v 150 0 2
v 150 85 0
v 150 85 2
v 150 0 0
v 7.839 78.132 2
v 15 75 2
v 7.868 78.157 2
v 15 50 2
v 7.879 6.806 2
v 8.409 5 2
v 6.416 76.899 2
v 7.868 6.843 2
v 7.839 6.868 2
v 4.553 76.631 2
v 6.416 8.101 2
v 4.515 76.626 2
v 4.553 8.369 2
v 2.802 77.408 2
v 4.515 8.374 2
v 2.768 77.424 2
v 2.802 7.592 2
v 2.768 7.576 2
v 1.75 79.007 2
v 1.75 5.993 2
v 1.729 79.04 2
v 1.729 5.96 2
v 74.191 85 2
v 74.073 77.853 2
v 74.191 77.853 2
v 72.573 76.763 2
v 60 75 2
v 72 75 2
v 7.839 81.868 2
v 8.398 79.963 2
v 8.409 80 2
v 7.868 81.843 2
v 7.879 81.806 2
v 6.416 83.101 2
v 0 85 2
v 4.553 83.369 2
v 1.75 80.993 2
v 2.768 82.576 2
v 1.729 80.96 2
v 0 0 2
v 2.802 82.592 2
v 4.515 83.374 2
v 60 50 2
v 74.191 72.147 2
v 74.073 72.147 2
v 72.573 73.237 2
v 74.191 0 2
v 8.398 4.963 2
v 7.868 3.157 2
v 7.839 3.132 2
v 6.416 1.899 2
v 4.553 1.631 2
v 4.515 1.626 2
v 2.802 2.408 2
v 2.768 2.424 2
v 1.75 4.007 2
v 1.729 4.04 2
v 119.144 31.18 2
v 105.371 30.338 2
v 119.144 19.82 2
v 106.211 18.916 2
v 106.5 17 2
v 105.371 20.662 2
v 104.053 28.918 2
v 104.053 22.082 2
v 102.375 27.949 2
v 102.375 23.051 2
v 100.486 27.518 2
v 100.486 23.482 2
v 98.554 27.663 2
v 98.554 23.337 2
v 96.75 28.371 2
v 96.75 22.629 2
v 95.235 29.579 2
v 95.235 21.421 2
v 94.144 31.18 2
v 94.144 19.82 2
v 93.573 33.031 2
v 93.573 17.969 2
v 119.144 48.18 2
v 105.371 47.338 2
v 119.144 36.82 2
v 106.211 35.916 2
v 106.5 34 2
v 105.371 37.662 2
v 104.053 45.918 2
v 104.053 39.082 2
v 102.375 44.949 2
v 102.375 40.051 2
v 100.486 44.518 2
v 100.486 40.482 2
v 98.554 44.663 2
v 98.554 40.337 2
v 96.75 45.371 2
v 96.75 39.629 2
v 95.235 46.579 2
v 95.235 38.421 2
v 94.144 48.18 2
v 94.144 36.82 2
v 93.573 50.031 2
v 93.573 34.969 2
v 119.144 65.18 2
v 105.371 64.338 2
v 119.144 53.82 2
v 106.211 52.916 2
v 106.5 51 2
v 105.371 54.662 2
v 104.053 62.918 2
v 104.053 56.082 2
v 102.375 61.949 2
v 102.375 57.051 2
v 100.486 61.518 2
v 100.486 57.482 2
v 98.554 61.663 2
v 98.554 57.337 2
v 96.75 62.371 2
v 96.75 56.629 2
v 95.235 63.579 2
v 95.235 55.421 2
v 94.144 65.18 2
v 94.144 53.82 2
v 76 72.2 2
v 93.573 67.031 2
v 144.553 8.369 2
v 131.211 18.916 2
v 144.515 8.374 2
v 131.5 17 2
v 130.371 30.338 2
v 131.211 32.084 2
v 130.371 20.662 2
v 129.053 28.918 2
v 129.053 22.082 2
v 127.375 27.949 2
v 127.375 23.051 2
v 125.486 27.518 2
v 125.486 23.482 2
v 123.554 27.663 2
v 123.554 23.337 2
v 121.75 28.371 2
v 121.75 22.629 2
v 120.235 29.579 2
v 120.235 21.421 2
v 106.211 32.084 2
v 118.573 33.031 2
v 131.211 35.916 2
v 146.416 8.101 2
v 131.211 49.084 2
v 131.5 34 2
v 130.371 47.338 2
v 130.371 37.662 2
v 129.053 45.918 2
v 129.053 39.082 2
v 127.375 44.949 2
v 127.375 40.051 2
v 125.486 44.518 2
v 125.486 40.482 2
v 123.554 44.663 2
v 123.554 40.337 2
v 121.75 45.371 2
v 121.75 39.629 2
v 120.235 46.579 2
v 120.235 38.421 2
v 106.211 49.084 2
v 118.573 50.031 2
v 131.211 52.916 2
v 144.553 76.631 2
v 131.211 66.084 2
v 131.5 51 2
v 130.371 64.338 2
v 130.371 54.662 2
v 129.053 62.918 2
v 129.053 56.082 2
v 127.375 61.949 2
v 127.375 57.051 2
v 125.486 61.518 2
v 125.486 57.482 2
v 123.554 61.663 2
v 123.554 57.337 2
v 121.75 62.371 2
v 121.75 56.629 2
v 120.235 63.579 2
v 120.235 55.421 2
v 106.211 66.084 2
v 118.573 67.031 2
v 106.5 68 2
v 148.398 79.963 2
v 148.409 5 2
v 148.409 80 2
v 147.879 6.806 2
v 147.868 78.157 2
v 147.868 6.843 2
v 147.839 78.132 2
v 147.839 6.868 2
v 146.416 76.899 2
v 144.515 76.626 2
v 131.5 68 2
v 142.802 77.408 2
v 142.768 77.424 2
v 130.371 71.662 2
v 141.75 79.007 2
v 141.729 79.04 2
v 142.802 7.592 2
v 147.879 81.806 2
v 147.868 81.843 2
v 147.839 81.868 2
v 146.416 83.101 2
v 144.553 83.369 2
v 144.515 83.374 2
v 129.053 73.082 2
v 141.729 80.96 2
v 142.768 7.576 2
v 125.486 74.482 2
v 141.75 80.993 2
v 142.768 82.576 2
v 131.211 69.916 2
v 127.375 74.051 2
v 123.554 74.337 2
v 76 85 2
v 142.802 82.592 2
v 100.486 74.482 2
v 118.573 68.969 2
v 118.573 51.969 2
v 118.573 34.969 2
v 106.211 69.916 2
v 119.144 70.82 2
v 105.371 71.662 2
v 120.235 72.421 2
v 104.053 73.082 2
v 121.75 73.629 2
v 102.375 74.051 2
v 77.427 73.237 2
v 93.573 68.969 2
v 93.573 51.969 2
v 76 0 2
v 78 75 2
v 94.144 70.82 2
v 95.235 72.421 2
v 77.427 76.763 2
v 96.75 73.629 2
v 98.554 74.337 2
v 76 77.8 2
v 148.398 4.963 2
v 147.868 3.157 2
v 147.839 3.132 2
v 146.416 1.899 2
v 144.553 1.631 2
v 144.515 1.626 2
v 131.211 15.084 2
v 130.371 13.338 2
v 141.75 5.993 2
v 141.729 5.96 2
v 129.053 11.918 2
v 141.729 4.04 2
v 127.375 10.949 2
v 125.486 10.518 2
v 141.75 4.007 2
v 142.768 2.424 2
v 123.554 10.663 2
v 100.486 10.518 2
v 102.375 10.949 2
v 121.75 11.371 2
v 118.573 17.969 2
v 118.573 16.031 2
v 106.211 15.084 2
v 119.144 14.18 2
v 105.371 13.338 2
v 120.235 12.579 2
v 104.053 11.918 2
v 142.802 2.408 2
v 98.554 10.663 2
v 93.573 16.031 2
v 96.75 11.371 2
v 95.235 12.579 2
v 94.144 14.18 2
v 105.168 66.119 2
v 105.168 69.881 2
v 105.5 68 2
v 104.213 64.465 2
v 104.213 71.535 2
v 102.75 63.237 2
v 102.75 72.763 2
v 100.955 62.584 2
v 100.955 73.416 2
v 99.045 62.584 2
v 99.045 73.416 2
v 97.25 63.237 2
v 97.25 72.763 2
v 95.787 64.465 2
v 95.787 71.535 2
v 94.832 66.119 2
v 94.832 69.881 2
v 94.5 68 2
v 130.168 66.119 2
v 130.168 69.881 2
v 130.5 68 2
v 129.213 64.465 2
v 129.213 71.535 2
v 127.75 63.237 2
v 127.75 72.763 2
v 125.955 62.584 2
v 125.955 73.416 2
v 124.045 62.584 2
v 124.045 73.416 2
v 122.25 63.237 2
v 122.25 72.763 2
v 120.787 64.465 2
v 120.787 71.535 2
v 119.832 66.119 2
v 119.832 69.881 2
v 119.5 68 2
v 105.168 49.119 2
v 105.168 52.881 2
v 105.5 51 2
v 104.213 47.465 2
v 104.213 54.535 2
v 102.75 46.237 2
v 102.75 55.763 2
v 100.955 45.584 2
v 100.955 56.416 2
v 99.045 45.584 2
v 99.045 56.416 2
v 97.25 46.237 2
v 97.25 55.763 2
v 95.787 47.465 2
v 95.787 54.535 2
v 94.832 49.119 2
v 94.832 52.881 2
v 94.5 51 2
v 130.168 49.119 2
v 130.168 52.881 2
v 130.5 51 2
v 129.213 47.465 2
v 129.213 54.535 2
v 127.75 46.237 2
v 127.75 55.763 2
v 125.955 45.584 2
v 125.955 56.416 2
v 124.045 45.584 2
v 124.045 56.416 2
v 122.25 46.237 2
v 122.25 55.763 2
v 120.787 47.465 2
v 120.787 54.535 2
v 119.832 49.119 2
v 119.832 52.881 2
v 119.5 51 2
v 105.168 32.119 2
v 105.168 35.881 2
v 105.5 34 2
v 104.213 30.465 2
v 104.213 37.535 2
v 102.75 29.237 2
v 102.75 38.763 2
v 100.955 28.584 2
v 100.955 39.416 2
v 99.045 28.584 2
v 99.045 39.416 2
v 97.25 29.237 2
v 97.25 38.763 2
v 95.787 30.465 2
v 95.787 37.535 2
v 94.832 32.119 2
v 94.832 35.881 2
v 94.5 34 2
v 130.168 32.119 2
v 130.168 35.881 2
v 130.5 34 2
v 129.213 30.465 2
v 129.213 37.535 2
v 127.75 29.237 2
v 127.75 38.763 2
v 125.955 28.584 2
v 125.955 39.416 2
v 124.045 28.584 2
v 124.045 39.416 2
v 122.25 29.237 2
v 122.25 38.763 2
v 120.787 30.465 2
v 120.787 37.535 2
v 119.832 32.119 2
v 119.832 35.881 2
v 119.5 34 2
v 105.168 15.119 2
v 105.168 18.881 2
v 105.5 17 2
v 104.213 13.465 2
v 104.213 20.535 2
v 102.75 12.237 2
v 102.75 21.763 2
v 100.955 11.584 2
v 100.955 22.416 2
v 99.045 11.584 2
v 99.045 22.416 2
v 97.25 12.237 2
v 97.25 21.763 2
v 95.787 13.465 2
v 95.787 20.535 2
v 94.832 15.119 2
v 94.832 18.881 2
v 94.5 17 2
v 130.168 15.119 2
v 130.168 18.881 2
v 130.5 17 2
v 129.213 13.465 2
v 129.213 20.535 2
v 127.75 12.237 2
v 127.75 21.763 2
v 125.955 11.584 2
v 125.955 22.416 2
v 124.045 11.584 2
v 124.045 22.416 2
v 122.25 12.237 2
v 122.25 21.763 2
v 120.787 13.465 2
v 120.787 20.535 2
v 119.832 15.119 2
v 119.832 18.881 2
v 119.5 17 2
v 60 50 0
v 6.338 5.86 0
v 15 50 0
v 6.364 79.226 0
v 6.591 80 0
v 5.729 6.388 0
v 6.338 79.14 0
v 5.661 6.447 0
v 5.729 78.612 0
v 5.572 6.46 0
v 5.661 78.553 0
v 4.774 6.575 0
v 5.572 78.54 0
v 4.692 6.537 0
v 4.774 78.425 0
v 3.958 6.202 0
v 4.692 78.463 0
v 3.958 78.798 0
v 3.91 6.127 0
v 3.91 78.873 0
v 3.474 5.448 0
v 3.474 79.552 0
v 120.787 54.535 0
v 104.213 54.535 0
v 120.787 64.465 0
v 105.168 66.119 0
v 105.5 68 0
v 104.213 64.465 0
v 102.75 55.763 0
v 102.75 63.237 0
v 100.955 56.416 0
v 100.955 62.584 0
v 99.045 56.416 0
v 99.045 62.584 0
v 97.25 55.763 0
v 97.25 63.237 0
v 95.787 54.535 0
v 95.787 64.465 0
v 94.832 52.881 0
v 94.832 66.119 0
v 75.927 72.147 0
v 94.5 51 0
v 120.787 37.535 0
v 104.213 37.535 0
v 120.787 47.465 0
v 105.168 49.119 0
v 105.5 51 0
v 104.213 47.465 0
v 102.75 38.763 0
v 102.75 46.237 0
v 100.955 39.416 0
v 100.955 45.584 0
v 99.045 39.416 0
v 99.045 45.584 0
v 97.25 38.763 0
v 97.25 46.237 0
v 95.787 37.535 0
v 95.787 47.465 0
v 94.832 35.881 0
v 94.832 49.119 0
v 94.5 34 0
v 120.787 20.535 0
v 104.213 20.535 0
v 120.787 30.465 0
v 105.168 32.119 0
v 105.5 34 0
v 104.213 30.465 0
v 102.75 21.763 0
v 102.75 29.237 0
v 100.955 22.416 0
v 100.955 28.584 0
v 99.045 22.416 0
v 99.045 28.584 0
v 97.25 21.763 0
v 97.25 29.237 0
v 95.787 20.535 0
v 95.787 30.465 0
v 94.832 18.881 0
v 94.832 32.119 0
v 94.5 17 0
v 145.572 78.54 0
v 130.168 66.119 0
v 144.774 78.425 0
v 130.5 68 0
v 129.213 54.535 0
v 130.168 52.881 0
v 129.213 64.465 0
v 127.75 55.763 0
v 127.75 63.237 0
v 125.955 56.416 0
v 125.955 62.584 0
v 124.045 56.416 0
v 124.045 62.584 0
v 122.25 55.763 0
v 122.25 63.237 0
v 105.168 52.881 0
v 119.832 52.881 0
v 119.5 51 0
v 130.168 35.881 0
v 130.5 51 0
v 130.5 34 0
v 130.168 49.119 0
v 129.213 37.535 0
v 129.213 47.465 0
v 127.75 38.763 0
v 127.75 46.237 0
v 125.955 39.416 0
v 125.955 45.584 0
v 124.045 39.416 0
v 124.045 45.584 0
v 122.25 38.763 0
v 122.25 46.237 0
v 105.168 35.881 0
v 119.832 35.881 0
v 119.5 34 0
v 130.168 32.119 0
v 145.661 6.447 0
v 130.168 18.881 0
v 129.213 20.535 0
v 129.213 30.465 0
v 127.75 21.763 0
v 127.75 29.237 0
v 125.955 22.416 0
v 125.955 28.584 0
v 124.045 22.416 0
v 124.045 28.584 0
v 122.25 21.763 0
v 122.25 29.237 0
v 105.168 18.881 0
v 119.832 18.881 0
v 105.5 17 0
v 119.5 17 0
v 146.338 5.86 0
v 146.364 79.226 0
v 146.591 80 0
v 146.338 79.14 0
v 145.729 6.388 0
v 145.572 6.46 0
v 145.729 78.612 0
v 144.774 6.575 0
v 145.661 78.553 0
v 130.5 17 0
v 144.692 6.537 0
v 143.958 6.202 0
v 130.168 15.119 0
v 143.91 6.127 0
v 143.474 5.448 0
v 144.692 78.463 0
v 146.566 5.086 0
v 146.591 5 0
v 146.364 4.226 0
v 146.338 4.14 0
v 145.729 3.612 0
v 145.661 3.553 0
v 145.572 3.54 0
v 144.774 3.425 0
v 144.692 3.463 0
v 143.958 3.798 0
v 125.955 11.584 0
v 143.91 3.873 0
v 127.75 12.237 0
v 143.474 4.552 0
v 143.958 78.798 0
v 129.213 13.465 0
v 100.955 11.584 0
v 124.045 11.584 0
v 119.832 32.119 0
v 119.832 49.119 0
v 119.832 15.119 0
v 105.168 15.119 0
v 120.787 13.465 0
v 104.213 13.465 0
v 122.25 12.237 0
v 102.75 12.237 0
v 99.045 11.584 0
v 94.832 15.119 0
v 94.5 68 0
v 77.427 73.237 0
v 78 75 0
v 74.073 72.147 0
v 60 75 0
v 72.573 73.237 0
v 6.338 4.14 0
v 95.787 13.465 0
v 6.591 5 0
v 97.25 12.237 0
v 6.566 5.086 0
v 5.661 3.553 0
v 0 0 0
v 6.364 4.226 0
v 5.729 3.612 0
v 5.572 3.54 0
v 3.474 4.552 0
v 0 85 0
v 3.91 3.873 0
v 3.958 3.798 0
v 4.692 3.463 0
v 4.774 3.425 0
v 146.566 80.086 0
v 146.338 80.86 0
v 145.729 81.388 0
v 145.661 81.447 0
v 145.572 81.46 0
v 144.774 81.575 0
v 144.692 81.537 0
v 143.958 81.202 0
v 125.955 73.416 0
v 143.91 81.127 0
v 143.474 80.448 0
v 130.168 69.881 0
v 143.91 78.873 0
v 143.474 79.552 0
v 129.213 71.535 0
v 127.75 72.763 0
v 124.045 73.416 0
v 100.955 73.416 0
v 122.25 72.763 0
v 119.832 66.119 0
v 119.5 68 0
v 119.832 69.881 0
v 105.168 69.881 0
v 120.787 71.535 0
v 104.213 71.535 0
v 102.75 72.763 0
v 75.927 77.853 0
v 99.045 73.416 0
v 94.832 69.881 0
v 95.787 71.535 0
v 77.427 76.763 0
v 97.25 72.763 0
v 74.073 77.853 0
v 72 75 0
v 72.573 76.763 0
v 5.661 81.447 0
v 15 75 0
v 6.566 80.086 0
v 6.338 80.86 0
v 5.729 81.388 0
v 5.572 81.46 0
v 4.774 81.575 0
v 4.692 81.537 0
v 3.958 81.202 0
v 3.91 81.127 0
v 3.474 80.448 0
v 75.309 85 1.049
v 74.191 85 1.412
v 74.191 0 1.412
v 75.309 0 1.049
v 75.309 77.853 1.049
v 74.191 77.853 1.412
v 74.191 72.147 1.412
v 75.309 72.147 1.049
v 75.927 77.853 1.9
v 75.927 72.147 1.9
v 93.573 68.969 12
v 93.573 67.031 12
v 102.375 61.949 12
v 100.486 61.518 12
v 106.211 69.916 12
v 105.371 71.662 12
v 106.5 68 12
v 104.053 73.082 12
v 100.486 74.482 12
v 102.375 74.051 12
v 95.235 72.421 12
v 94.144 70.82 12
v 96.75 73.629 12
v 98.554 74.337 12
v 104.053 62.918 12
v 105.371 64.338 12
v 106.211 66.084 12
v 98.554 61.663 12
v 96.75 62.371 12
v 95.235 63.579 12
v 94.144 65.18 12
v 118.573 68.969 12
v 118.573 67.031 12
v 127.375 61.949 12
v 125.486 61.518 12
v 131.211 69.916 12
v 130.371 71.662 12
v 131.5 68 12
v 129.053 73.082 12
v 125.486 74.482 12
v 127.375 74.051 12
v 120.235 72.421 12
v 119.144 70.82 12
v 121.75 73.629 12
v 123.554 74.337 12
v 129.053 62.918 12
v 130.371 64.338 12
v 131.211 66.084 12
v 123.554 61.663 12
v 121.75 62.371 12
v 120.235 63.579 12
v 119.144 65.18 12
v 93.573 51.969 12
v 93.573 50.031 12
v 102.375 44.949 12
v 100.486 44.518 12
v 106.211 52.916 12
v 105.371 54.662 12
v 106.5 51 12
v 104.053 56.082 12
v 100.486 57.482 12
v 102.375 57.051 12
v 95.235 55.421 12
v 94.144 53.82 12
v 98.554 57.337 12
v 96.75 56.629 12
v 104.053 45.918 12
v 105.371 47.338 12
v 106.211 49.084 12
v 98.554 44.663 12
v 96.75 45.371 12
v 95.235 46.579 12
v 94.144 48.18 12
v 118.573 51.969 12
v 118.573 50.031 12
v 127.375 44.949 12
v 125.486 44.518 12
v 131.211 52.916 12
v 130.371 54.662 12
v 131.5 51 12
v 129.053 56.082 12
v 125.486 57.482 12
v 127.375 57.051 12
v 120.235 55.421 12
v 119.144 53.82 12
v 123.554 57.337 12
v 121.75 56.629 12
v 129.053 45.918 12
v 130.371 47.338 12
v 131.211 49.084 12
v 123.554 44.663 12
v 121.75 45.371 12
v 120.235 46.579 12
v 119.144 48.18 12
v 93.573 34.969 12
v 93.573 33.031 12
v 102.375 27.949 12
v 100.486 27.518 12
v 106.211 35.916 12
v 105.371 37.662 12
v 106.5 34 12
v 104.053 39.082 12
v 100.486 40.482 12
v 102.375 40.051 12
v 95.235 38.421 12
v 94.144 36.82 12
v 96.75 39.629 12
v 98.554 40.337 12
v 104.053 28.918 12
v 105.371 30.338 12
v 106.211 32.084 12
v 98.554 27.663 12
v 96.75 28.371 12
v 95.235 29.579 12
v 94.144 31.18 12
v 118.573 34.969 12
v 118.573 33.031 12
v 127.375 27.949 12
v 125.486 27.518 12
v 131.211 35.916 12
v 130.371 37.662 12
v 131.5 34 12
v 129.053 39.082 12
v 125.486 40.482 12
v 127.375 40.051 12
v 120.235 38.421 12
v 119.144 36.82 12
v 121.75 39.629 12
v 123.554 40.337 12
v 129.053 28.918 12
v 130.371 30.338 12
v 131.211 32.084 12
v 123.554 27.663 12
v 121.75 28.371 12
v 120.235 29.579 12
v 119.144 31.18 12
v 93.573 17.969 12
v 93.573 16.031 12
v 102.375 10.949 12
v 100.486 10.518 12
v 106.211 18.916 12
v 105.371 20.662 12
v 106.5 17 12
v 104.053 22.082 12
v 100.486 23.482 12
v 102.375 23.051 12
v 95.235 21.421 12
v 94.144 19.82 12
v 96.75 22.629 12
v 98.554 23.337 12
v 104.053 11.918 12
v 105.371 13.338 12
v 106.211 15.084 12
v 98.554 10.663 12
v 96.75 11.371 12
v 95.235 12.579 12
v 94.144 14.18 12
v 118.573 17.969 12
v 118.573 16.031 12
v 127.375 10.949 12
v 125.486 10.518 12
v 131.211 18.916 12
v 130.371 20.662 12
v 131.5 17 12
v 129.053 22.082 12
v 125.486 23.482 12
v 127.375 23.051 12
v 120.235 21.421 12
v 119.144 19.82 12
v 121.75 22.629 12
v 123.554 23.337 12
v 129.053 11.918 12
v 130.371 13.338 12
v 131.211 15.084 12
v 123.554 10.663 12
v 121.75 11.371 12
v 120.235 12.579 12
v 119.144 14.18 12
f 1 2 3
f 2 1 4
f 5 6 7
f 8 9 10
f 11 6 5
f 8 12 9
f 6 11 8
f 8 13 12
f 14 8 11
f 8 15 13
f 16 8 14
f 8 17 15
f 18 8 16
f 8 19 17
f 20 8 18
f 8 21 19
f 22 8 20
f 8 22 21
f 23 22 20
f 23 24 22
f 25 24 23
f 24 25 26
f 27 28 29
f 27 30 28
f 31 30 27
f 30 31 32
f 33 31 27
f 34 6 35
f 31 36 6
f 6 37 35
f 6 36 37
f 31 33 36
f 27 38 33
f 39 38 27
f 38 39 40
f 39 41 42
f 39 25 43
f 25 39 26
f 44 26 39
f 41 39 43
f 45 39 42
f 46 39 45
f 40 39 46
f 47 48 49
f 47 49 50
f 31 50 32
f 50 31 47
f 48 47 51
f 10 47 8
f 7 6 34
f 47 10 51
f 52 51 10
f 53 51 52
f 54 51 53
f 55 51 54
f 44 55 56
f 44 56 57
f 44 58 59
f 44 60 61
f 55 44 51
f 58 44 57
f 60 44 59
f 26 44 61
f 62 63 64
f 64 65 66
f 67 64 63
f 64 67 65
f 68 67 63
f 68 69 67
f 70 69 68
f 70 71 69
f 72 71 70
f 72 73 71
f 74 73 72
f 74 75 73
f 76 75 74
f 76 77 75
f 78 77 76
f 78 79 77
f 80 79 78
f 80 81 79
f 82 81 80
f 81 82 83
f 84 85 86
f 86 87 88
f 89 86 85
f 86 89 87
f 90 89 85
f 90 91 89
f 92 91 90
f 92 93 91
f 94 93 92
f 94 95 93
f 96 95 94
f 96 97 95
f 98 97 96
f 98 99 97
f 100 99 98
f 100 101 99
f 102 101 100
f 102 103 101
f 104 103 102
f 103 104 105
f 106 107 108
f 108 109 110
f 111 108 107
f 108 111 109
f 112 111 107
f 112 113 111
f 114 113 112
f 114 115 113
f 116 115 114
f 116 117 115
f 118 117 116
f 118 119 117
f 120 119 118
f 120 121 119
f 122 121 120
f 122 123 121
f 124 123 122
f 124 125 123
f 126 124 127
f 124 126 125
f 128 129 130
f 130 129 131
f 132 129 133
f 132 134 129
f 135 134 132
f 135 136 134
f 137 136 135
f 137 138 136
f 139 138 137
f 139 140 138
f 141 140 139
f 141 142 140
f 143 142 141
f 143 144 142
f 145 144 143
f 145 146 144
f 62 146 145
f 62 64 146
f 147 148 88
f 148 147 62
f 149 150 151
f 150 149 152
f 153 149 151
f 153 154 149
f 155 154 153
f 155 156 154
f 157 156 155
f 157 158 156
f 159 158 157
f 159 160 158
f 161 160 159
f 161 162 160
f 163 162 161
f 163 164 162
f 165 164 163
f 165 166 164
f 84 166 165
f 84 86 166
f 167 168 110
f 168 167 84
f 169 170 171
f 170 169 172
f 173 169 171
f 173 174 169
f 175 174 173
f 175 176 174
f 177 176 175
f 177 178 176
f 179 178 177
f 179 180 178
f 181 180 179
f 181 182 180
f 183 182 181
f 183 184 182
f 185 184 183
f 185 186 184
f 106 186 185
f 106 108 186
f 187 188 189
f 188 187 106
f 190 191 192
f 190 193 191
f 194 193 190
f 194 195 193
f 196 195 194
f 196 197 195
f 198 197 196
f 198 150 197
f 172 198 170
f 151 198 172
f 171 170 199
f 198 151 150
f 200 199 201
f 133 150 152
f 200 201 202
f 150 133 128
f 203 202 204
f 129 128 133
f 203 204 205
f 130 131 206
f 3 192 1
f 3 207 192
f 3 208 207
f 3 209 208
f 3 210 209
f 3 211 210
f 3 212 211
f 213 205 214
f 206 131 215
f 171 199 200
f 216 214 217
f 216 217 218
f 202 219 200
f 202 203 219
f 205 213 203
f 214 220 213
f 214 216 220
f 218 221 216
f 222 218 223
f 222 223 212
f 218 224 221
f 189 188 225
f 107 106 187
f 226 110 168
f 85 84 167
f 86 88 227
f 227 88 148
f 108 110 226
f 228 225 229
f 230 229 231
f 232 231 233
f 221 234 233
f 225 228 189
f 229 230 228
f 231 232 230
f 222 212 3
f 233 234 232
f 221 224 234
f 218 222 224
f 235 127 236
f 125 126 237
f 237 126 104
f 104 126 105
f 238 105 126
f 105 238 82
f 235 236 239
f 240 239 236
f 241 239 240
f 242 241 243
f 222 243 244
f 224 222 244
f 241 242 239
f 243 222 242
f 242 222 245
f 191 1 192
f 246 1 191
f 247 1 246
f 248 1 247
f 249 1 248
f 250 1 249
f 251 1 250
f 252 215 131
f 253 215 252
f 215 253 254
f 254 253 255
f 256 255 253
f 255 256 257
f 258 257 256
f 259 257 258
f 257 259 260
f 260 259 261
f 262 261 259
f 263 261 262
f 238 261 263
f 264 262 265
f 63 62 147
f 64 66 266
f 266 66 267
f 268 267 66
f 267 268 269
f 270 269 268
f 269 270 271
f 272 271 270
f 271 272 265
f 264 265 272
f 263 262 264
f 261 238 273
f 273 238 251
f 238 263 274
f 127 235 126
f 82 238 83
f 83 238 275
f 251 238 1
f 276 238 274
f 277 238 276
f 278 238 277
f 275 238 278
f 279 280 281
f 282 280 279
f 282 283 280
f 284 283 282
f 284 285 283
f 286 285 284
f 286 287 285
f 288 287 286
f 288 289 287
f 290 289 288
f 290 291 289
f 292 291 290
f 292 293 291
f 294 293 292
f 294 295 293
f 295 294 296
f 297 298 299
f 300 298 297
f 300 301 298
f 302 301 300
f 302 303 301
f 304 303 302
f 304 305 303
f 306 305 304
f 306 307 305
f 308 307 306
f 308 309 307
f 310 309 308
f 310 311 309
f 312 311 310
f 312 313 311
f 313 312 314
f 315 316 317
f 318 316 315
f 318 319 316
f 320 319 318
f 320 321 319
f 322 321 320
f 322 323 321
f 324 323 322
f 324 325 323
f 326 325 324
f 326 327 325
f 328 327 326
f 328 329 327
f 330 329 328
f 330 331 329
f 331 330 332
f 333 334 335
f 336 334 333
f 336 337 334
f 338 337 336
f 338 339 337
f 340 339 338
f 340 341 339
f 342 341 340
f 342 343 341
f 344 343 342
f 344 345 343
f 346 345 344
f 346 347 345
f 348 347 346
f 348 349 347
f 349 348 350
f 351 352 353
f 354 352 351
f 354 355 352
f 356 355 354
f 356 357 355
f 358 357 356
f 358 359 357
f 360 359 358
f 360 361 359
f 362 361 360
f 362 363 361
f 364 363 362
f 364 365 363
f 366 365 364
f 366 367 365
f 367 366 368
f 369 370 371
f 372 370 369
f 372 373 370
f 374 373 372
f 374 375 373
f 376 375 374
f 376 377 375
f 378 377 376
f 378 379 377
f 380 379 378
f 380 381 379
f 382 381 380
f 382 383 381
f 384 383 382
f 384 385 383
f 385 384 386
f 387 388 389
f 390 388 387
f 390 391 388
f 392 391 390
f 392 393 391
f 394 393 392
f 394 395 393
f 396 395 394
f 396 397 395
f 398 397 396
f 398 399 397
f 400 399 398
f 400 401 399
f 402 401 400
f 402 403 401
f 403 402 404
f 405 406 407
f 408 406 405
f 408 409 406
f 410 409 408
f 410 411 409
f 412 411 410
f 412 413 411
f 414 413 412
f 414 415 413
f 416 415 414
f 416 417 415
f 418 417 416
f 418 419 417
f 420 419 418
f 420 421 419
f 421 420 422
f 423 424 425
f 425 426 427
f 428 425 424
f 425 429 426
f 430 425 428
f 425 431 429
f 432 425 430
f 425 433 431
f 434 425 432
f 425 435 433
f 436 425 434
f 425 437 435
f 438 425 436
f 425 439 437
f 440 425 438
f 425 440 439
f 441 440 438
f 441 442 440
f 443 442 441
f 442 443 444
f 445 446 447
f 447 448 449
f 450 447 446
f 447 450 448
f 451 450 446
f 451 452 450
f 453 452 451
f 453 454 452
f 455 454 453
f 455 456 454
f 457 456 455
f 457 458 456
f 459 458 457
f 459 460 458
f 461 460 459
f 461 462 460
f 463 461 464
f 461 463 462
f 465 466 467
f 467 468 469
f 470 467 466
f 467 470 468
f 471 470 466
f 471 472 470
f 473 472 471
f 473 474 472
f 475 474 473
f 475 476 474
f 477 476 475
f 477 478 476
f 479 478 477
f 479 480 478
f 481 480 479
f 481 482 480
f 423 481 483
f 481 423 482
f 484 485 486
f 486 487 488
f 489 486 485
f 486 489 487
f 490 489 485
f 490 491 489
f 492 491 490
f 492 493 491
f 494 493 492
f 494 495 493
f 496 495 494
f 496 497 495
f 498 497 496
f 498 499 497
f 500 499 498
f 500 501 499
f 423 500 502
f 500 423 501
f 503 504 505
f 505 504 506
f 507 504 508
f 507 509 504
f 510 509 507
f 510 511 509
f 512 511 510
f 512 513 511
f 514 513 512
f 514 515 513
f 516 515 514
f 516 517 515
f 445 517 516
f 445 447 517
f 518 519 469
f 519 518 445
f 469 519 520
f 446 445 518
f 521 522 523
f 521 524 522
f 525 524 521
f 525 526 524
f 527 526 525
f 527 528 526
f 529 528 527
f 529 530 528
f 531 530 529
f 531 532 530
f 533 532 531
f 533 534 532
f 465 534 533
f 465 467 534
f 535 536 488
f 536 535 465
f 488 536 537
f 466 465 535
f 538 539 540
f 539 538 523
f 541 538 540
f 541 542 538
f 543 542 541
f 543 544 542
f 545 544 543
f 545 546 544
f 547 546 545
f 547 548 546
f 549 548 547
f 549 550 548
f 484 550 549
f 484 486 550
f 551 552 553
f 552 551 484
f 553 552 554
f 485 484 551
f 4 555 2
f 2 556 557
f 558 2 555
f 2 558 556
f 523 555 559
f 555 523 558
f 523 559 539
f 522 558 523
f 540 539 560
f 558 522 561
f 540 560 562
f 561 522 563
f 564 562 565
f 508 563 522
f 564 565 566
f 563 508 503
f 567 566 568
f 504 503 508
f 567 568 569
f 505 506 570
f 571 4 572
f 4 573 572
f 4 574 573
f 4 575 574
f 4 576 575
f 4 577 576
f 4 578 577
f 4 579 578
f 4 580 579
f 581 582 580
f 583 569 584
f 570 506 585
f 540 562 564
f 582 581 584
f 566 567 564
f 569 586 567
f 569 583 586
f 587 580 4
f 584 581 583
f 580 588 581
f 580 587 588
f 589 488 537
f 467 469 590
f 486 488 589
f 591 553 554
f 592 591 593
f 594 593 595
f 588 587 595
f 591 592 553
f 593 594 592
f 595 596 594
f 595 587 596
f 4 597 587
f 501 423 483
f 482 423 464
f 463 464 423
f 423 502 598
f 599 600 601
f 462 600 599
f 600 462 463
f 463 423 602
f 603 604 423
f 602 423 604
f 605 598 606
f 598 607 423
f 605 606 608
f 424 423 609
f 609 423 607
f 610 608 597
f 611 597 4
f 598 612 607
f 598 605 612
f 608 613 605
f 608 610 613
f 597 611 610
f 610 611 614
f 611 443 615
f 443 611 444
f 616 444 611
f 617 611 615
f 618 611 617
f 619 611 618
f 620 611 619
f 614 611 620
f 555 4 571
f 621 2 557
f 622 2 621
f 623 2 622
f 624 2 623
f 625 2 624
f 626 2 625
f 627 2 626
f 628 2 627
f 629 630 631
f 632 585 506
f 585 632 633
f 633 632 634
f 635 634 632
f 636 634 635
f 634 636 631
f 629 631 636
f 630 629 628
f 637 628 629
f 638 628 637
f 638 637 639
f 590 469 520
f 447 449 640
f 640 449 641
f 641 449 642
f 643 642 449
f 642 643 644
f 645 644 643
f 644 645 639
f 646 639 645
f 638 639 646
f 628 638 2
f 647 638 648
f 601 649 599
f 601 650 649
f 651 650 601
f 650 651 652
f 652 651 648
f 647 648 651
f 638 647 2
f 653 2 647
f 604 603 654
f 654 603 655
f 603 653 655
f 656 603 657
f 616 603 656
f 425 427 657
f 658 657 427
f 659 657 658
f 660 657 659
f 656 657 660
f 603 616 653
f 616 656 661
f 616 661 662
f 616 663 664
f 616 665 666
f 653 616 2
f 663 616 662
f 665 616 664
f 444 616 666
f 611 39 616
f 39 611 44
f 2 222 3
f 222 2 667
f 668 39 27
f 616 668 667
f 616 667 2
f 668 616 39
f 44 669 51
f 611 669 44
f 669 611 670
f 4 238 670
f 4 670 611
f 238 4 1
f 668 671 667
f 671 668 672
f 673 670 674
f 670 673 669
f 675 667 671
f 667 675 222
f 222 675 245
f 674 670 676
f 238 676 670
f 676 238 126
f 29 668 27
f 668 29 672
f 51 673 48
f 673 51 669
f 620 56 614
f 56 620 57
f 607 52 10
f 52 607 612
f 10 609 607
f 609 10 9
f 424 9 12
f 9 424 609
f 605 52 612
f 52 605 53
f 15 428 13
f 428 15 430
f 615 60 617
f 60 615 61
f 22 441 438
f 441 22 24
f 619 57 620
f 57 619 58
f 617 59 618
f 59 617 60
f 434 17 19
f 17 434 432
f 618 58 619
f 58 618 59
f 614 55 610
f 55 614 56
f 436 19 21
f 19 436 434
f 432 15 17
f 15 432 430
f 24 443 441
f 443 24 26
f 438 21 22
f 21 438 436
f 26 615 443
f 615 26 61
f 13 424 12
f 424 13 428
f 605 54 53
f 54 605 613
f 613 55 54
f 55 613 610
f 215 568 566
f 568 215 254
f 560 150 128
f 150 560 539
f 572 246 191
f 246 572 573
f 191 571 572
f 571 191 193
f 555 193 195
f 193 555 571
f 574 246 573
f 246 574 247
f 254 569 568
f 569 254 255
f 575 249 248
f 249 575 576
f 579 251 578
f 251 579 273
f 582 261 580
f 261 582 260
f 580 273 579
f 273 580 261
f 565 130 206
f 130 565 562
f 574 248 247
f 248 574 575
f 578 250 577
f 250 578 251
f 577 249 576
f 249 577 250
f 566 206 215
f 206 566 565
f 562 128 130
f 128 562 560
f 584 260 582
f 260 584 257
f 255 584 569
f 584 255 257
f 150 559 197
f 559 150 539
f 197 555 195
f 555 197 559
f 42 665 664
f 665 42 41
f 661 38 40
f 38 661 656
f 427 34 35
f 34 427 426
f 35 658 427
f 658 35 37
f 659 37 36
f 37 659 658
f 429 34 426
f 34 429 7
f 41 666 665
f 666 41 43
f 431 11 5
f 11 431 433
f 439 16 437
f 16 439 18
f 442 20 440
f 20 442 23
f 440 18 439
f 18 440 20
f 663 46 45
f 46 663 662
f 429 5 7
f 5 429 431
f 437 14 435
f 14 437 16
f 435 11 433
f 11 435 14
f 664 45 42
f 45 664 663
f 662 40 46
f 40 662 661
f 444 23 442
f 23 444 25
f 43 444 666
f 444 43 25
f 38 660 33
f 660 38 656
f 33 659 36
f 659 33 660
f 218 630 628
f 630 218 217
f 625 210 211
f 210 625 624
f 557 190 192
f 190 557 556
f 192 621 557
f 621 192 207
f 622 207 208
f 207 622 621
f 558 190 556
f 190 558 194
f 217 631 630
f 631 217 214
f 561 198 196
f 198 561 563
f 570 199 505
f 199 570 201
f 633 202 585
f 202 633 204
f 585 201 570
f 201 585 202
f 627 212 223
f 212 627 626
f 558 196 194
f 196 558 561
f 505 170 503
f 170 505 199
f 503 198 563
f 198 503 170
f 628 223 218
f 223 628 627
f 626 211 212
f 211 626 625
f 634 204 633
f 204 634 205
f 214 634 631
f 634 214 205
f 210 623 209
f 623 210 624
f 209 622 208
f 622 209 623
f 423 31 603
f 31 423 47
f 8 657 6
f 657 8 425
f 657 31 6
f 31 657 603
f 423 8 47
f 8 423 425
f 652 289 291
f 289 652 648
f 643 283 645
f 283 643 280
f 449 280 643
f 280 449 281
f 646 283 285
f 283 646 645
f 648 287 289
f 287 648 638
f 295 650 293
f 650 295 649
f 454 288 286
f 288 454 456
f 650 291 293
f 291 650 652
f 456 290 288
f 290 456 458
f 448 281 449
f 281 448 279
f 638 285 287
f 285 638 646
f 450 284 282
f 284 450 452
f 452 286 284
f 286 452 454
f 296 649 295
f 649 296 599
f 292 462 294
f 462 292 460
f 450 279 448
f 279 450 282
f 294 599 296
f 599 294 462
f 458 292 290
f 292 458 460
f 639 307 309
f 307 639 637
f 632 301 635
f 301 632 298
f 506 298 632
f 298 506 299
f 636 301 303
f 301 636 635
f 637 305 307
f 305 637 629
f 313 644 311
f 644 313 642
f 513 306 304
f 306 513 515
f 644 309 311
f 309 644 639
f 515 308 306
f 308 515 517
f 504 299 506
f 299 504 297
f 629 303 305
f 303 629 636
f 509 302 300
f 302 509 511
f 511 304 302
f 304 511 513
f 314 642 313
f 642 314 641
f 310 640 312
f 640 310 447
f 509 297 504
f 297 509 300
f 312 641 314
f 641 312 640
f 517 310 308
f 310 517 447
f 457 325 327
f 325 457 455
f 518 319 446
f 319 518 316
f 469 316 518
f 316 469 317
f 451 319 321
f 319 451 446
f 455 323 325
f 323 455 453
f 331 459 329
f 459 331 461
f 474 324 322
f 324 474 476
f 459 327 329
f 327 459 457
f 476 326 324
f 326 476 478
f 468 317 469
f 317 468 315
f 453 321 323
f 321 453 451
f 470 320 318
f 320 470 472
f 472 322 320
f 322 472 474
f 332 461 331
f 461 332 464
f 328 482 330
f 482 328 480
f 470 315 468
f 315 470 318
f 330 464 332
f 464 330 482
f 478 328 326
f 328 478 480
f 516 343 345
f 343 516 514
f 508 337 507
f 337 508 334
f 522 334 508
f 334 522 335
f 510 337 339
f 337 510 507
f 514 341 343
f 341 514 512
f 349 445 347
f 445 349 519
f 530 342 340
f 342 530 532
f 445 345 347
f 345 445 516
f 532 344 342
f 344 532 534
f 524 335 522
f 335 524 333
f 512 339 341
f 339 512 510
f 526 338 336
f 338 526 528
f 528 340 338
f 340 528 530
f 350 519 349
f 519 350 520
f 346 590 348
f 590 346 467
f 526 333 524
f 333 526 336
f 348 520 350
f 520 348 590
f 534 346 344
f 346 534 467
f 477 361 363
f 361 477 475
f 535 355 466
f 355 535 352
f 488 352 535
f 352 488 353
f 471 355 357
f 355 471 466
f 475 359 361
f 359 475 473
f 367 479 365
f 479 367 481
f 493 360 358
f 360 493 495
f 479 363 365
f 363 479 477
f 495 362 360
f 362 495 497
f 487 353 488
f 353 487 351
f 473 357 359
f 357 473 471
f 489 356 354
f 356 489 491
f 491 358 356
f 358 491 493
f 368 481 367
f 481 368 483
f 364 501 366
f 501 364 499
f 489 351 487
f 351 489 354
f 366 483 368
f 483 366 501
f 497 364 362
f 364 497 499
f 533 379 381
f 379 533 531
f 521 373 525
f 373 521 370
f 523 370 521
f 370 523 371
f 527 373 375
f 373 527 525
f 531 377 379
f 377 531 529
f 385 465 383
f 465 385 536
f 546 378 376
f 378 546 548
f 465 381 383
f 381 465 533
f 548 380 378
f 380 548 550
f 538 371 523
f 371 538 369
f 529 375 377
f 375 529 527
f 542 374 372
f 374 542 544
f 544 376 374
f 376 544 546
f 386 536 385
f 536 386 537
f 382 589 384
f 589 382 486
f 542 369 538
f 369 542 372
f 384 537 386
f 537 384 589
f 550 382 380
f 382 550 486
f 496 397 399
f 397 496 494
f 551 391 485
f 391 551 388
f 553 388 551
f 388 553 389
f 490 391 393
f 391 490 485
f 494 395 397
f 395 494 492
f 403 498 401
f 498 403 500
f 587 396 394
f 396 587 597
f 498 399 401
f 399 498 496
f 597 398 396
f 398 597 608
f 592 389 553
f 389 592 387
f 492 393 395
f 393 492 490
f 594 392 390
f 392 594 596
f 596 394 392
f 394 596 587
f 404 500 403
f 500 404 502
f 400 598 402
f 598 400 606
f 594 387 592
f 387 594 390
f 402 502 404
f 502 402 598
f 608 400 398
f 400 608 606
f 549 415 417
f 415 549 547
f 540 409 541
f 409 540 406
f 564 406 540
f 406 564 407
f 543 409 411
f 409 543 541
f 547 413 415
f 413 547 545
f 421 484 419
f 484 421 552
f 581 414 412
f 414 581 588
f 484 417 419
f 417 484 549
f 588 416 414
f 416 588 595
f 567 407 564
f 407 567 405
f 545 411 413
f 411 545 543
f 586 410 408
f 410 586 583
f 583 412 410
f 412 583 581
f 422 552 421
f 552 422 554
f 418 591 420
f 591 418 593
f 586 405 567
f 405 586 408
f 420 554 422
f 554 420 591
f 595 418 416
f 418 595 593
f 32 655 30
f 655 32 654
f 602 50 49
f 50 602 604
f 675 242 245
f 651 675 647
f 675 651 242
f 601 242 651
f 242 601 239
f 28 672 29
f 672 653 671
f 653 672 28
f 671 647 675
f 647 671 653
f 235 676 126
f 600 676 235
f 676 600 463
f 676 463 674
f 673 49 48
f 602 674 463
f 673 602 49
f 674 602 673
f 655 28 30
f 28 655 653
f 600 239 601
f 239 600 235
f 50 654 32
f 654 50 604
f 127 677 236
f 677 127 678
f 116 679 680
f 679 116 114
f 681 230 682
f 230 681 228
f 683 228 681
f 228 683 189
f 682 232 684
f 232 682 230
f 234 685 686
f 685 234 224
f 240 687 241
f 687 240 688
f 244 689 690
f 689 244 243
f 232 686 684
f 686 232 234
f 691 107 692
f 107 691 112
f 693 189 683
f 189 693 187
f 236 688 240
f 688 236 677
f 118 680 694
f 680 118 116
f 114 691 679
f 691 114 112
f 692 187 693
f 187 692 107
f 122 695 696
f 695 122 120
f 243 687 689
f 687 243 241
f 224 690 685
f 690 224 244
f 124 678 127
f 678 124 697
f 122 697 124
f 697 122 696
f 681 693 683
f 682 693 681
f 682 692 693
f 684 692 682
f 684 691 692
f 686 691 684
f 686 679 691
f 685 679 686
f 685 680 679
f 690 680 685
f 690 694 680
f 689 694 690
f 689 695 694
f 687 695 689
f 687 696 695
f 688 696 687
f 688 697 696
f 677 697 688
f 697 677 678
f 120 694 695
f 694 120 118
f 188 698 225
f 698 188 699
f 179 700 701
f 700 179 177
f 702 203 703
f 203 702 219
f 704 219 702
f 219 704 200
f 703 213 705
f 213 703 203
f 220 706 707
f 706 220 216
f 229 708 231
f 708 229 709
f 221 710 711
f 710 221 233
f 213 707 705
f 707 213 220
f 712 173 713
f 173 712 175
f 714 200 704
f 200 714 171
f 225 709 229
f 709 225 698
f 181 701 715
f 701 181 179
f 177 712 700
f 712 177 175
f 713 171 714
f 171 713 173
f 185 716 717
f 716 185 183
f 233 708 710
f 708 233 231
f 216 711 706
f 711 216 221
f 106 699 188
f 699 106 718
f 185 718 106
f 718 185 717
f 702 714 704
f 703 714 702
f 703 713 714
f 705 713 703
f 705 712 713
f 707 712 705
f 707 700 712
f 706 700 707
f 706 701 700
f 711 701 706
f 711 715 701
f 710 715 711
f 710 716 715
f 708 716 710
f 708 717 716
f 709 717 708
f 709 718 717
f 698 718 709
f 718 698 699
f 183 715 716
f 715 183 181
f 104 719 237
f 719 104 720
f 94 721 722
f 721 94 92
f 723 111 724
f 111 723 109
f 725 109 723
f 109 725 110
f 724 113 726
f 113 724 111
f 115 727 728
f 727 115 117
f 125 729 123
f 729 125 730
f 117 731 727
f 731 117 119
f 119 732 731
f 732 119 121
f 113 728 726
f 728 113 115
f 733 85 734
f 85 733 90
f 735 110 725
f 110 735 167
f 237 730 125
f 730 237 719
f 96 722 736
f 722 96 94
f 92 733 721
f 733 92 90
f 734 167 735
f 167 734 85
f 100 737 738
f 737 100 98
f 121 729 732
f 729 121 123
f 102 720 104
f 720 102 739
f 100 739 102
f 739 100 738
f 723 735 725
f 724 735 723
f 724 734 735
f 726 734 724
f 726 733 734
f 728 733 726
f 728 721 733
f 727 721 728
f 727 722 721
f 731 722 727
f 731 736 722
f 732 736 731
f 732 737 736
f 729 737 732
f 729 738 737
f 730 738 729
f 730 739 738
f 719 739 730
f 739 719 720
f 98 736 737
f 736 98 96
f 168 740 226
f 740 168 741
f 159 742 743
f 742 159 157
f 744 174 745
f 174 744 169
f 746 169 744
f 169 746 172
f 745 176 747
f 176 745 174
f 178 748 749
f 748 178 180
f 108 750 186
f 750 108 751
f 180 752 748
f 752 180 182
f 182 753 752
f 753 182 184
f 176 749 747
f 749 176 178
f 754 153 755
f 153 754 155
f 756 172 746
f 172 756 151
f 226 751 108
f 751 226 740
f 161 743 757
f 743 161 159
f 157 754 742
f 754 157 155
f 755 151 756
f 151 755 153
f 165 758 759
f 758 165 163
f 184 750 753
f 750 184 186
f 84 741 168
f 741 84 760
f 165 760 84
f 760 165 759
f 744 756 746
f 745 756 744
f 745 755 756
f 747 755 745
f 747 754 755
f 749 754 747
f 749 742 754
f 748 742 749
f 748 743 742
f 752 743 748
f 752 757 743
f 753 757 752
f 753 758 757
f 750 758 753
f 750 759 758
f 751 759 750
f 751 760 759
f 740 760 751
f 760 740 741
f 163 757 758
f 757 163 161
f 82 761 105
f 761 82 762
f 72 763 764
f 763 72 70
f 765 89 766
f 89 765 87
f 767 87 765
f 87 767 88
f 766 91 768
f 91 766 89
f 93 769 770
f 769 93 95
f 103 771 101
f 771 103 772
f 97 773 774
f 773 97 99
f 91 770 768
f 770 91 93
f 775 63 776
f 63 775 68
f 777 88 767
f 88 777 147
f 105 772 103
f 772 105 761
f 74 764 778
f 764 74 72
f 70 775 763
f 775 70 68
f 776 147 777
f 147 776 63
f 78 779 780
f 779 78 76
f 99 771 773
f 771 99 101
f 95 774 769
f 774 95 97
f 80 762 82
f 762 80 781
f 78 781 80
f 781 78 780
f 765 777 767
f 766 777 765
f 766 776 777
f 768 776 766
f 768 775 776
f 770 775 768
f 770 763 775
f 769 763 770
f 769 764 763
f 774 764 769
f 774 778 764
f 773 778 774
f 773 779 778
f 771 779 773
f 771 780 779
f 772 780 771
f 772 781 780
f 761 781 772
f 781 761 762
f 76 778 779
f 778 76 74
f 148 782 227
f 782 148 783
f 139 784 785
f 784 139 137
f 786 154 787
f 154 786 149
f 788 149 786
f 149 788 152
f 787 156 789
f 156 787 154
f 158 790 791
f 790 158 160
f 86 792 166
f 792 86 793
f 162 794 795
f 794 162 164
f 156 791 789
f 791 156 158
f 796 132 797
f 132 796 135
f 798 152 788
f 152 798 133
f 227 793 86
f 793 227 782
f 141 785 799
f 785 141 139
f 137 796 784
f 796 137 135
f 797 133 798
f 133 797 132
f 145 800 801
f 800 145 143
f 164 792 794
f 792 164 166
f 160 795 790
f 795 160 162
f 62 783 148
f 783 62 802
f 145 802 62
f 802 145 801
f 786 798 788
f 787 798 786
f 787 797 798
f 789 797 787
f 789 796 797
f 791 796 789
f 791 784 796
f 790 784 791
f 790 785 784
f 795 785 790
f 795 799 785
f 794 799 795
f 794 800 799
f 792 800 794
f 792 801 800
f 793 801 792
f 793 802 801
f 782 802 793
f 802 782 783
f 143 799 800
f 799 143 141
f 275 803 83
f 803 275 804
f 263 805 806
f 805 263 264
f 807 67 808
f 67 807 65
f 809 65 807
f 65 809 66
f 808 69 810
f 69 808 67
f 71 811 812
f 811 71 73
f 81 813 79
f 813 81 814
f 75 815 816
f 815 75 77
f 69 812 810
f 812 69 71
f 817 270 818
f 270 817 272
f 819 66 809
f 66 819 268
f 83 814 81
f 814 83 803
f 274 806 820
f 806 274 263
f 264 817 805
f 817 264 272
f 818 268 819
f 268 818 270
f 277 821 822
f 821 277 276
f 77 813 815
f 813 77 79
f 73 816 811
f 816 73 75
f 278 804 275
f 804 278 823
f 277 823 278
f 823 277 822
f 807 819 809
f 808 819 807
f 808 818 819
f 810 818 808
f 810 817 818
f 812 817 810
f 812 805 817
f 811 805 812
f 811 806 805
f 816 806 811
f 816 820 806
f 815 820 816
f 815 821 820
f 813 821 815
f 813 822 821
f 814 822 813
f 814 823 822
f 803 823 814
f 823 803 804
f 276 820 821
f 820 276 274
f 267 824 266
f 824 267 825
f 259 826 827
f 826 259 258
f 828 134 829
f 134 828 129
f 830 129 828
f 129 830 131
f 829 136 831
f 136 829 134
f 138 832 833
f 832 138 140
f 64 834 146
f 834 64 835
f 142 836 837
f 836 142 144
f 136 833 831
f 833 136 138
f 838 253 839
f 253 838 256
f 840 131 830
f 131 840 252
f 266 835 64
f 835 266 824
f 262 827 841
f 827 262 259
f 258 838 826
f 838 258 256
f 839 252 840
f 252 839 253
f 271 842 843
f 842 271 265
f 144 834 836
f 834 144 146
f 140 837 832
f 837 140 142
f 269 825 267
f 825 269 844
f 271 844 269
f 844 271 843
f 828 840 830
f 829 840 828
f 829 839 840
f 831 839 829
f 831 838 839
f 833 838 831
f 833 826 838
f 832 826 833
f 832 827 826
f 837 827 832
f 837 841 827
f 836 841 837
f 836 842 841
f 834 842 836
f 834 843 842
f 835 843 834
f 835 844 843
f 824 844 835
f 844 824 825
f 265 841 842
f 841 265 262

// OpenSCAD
module plaqueAlim(l=150, L=85, e=2) {
    color("blue") difference() {
        //plaque
        cube([l,L,e]);
        // Séparation
        translate([l/2,-0.1,e]) rotate([-90,0,0]) cylinder(d=2, h=L+0.2);
        //vis
        translate([5,5,-0.1]) cylinder(d=3, d2=7, h=e+0.2);
        translate([l-5,5,-0.1]) cylinder(d=3, d2=7, h=e+0.2);
        translate([5,L-5,-0.1]) cylinder(d=3, d2=7, h=e+0.2);
        translate([l-5,L-5,-0.1]) cylinder(d=3, d2=7, h=e+0.2);
        // voltmetre
        v_l=45;
        v_L=25;
        translate([l/4-v_l/2,L-10-v_L,-0.1]) cube([v_l,v_L,e+0.2]);
        // -12V
        translate([l/2 + (l/2)/3, 4*L/5, -0.1]) cylinder(d=11, h=e+0.2);
        translate([l/2 + 2*(l/2)/3, 4*L/5, -0.1]) cylinder(d=11, h=e+0.2);
        // 12V
        translate([l/2 + (l/2)/3, 3*L/5, -0.1]) cylinder(d=11, h=e+0.2);
        translate([l/2 + 2*(l/2)/3, 3*L/5, -0.1]) cylinder(d=11, h=e+0.2);
        // 5V
        translate([l/2 + (l/2)/3, 2*L/5, -0.1]) cylinder(d=11, h=e+0.2);
        translate([l/2 + 2*(l/2)/3, 2*L/5, -0.1]) cylinder(d=11, h=e+0.2);
        // 3.3V
        translate([l/2 + (l/2)/3, L/5, -0.1]) cylinder(d=11, h=e+0.2);
        translate([l/2 + 2*(l/2)/3, L/5, -0.1]) cylinder(d=11, h=e+0.2);
        
        // LED
        translate([l/2, L-10, -0.1]) cylinder(d=6, h=e+0.2);
        
        //Interrupteur
        
    }
}

module cosses(l, L, e) {
    cosse_d=13;
    cosse_h=10;
    // -12V
        color("green") translate([l/2 + (l/2)/3, 4*L/5, e]) cylinder(d=cosse_d, h=cosse_h);
        color("black") translate([l/2 + 2*(l/2)/3, 4*L/5, e]) cylinder(d=cosse_d, h=cosse_h);
        // 12V
        color("red") translate([l/2 + (l/2)/3, 3*L/5, e]) cylinder(d=cosse_d, h=cosse_h);
        color("black") translate([l/2 + 2*(l/2)/3, 3*L/5, e]) cylinder(d=cosse_d, h=cosse_h);
        // 5V
        color("yellow") translate([l/2 + (l/2)/3, 2*L/5, e]) cylinder(d=cosse_d, h=cosse_h);
        color("black") translate([l/2 + 2*(l/2)/3, 2*L/5, e]) cylinder(d=cosse_d, h=cosse_h);
        // 3.3V
        color("blue") translate([l/2 + (l/2)/3, L/5, e]) cylinder(d=cosse_d, h=cosse_h);
        color("black") translate([l/2 + 2*(l/2)/3, L/5, e]) cylinder(d=cosse_d, h=cosse_h);
}

module plaqueAlimAll(l=150, L=85, e=2) {
    plaqueAlim(l,L,e);
    cosses(l,L,e);
}

plaqueAlimAll(150,85,2);
